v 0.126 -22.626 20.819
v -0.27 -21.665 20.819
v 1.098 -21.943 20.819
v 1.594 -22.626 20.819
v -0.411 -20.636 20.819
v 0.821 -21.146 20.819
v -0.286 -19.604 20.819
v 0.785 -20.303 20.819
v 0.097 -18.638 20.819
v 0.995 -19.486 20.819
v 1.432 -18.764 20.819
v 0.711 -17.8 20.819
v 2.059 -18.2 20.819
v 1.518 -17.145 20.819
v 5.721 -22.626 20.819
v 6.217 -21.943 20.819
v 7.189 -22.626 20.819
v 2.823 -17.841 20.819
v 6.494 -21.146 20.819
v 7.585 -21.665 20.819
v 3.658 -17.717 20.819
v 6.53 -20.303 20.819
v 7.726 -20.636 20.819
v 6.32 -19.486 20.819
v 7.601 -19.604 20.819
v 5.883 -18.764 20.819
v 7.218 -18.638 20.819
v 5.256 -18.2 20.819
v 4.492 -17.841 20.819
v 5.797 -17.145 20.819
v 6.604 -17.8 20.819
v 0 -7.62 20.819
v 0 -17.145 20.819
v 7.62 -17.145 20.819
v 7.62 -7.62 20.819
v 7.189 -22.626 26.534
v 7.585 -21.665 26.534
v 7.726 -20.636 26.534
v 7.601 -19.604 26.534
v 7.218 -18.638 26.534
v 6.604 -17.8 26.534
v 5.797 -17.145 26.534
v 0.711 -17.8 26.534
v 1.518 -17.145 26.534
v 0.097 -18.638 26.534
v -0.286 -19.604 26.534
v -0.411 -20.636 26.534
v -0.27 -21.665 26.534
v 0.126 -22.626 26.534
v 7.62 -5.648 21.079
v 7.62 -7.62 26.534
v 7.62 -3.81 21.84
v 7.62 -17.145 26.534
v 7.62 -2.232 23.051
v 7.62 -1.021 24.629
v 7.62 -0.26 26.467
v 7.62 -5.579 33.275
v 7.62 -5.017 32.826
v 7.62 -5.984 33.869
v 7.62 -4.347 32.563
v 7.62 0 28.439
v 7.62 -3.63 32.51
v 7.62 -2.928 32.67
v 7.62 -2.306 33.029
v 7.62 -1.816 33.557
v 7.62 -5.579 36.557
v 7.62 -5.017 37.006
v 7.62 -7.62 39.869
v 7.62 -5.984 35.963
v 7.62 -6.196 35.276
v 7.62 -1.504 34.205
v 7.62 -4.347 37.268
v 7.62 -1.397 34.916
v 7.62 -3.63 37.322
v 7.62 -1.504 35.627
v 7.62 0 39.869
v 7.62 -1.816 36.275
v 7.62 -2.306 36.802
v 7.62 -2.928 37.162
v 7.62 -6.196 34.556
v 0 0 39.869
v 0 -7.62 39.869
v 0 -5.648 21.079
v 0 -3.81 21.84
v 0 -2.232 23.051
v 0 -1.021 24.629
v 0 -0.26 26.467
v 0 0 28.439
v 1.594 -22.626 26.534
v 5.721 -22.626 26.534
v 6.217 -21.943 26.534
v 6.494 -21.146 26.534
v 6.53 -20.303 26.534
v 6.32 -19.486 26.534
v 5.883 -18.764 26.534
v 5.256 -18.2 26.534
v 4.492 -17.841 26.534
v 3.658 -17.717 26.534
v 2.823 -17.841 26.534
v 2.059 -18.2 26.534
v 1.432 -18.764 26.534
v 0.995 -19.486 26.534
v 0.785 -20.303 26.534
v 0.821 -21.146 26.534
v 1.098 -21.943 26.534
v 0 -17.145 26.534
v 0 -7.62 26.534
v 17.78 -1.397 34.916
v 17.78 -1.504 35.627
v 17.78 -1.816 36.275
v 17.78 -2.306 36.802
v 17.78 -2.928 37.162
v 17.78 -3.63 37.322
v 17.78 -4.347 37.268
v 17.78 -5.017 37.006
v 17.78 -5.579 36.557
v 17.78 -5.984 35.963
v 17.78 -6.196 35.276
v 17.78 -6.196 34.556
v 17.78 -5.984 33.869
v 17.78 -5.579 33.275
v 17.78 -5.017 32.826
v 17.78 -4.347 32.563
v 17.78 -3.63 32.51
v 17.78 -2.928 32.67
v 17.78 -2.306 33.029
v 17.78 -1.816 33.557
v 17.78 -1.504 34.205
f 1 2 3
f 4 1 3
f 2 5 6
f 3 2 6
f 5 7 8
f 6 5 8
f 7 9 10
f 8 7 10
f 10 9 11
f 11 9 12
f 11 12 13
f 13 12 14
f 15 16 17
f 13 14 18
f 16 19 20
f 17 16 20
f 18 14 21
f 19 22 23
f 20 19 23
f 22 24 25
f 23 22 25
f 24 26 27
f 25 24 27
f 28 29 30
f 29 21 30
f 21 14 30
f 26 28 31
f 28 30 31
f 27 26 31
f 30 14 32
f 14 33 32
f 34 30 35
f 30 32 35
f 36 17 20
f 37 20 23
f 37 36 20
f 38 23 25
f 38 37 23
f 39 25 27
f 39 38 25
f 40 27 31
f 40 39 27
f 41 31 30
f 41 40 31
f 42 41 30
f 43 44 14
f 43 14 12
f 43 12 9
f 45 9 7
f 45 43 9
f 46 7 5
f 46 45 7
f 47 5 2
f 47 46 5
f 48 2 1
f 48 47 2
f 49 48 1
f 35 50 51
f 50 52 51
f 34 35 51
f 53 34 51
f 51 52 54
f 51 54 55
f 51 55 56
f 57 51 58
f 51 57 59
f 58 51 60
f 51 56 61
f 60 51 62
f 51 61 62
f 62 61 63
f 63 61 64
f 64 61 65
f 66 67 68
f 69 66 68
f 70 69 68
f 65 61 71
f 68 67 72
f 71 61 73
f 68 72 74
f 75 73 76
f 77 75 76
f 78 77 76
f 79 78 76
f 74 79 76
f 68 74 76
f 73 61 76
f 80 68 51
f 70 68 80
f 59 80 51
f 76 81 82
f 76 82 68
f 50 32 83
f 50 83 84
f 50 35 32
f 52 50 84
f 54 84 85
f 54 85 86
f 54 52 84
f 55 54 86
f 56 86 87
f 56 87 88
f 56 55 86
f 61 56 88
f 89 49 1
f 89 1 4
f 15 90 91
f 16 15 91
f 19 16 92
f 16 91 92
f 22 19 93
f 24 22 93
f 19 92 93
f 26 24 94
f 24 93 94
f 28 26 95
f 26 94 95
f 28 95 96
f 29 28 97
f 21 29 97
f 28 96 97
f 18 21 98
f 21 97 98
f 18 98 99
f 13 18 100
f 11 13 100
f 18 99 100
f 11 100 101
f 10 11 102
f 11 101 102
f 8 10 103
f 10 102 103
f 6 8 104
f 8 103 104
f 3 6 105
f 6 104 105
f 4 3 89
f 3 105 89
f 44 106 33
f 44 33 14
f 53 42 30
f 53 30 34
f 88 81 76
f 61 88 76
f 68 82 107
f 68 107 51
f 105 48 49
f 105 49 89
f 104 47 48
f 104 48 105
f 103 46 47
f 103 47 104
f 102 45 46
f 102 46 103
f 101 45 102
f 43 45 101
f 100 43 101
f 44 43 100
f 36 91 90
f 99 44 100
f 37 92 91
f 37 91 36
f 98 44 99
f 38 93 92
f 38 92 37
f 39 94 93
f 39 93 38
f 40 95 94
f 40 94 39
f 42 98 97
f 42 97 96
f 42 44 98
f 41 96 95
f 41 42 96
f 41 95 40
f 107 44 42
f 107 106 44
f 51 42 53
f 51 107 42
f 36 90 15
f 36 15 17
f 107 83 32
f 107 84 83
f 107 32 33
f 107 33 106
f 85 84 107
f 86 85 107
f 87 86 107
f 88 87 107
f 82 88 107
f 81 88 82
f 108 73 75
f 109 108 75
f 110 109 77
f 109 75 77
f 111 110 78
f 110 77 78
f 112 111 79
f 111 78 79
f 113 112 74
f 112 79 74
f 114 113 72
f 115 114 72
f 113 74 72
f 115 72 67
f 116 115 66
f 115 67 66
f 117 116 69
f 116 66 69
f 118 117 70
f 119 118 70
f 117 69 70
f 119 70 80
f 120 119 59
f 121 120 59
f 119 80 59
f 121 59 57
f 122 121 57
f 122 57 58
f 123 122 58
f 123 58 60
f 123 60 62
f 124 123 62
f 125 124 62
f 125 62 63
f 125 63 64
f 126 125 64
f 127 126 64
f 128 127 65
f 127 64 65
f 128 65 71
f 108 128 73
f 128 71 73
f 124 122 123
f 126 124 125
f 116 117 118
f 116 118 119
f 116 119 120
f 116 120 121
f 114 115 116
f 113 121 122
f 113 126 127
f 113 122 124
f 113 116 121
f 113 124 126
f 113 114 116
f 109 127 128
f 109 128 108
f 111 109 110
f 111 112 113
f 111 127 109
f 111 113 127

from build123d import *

# Parameters (mm, degrees)
F0_W      = 5.08
F0_H      = 12.7
F1_DEPTH  = 5.08
F2_W      = 5.08
F2_H      = 3.81
F3_DEPTH  = 6.35
F4_R      = 5.08
F5_R      = 2.7121475218
F6_DEPTH  = 3.81
F7_R      = 1.9253373718
F8_DEPTH  = 3.81
F9_W      = 5.3527112813
F9_H      = 1.6279429131
F10_DEPTH = 3.81
F11_SCALE = 1.5
F12_R     = 2.413
F13_DEPTH = 10.16


with BuildPart() as f1:
    # F0 (on Front) → F1 (new body)
    with BuildSketch(Plane.XZ):
        with Locations((2.54, 20.2292869008)):
            Rectangle(F0_W, F0_H)
    extrude(amount=F1_DEPTH)

    # F2 (on face) → F3 (join)
    with BuildSketch(Plane.XZ.offset(5.08)):
        with Locations((2.54, 15.7842869008)):
            Rectangle(F2_W, F2_H)
    extrude(amount=F3_DEPTH)

    # F4
    f4_edges = [f1.edges().sort_by_distance(p)[0] for p in [
        (2.54, 0, 13.879287),
    ]]
    fillet(f4_edges, radius=F4_R)

    # F5 (on face) → F6 (join)
    with BuildSketch(Plane.XY.offset(17.6892869008)):
        with Locations((2.4383503072, -13.7368525874)):
            Circle(F5_R)
    extrude(amount=-F6_DEPTH)

    # F7 (on face) → F8 (cut)
    with BuildSketch(Plane.XY.offset(17.6892869008)):
        with Locations((2.4383503072, -13.7368525874)):
            Circle(F7_R)
    extrude(amount=-F8_DEPTH, mode=Mode.SUBTRACT)

    # F9 (on face) → F10 (cut)
    with BuildSketch(Plane.XY.offset(17.6892869008)):
        with Locations((2.7606785416, -15.8977832678)):
            Rectangle(F9_W, F9_H)
    extrude(amount=-F10_DEPTH, mode=Mode.SUBTRACT)


with BuildPart() as f1_1:
    # F11: moved
    add(f1.part.scale(F11_SCALE))

    # F12 (on face) → F13 (join)
    with BuildSketch(Plane.YZ.offset(7.62)):
        with Locations((-3.81, 34.9159303513)):
            Circle(F12_R)
    extrude(amount=F13_DEPTH)


solid = f1_1.part
